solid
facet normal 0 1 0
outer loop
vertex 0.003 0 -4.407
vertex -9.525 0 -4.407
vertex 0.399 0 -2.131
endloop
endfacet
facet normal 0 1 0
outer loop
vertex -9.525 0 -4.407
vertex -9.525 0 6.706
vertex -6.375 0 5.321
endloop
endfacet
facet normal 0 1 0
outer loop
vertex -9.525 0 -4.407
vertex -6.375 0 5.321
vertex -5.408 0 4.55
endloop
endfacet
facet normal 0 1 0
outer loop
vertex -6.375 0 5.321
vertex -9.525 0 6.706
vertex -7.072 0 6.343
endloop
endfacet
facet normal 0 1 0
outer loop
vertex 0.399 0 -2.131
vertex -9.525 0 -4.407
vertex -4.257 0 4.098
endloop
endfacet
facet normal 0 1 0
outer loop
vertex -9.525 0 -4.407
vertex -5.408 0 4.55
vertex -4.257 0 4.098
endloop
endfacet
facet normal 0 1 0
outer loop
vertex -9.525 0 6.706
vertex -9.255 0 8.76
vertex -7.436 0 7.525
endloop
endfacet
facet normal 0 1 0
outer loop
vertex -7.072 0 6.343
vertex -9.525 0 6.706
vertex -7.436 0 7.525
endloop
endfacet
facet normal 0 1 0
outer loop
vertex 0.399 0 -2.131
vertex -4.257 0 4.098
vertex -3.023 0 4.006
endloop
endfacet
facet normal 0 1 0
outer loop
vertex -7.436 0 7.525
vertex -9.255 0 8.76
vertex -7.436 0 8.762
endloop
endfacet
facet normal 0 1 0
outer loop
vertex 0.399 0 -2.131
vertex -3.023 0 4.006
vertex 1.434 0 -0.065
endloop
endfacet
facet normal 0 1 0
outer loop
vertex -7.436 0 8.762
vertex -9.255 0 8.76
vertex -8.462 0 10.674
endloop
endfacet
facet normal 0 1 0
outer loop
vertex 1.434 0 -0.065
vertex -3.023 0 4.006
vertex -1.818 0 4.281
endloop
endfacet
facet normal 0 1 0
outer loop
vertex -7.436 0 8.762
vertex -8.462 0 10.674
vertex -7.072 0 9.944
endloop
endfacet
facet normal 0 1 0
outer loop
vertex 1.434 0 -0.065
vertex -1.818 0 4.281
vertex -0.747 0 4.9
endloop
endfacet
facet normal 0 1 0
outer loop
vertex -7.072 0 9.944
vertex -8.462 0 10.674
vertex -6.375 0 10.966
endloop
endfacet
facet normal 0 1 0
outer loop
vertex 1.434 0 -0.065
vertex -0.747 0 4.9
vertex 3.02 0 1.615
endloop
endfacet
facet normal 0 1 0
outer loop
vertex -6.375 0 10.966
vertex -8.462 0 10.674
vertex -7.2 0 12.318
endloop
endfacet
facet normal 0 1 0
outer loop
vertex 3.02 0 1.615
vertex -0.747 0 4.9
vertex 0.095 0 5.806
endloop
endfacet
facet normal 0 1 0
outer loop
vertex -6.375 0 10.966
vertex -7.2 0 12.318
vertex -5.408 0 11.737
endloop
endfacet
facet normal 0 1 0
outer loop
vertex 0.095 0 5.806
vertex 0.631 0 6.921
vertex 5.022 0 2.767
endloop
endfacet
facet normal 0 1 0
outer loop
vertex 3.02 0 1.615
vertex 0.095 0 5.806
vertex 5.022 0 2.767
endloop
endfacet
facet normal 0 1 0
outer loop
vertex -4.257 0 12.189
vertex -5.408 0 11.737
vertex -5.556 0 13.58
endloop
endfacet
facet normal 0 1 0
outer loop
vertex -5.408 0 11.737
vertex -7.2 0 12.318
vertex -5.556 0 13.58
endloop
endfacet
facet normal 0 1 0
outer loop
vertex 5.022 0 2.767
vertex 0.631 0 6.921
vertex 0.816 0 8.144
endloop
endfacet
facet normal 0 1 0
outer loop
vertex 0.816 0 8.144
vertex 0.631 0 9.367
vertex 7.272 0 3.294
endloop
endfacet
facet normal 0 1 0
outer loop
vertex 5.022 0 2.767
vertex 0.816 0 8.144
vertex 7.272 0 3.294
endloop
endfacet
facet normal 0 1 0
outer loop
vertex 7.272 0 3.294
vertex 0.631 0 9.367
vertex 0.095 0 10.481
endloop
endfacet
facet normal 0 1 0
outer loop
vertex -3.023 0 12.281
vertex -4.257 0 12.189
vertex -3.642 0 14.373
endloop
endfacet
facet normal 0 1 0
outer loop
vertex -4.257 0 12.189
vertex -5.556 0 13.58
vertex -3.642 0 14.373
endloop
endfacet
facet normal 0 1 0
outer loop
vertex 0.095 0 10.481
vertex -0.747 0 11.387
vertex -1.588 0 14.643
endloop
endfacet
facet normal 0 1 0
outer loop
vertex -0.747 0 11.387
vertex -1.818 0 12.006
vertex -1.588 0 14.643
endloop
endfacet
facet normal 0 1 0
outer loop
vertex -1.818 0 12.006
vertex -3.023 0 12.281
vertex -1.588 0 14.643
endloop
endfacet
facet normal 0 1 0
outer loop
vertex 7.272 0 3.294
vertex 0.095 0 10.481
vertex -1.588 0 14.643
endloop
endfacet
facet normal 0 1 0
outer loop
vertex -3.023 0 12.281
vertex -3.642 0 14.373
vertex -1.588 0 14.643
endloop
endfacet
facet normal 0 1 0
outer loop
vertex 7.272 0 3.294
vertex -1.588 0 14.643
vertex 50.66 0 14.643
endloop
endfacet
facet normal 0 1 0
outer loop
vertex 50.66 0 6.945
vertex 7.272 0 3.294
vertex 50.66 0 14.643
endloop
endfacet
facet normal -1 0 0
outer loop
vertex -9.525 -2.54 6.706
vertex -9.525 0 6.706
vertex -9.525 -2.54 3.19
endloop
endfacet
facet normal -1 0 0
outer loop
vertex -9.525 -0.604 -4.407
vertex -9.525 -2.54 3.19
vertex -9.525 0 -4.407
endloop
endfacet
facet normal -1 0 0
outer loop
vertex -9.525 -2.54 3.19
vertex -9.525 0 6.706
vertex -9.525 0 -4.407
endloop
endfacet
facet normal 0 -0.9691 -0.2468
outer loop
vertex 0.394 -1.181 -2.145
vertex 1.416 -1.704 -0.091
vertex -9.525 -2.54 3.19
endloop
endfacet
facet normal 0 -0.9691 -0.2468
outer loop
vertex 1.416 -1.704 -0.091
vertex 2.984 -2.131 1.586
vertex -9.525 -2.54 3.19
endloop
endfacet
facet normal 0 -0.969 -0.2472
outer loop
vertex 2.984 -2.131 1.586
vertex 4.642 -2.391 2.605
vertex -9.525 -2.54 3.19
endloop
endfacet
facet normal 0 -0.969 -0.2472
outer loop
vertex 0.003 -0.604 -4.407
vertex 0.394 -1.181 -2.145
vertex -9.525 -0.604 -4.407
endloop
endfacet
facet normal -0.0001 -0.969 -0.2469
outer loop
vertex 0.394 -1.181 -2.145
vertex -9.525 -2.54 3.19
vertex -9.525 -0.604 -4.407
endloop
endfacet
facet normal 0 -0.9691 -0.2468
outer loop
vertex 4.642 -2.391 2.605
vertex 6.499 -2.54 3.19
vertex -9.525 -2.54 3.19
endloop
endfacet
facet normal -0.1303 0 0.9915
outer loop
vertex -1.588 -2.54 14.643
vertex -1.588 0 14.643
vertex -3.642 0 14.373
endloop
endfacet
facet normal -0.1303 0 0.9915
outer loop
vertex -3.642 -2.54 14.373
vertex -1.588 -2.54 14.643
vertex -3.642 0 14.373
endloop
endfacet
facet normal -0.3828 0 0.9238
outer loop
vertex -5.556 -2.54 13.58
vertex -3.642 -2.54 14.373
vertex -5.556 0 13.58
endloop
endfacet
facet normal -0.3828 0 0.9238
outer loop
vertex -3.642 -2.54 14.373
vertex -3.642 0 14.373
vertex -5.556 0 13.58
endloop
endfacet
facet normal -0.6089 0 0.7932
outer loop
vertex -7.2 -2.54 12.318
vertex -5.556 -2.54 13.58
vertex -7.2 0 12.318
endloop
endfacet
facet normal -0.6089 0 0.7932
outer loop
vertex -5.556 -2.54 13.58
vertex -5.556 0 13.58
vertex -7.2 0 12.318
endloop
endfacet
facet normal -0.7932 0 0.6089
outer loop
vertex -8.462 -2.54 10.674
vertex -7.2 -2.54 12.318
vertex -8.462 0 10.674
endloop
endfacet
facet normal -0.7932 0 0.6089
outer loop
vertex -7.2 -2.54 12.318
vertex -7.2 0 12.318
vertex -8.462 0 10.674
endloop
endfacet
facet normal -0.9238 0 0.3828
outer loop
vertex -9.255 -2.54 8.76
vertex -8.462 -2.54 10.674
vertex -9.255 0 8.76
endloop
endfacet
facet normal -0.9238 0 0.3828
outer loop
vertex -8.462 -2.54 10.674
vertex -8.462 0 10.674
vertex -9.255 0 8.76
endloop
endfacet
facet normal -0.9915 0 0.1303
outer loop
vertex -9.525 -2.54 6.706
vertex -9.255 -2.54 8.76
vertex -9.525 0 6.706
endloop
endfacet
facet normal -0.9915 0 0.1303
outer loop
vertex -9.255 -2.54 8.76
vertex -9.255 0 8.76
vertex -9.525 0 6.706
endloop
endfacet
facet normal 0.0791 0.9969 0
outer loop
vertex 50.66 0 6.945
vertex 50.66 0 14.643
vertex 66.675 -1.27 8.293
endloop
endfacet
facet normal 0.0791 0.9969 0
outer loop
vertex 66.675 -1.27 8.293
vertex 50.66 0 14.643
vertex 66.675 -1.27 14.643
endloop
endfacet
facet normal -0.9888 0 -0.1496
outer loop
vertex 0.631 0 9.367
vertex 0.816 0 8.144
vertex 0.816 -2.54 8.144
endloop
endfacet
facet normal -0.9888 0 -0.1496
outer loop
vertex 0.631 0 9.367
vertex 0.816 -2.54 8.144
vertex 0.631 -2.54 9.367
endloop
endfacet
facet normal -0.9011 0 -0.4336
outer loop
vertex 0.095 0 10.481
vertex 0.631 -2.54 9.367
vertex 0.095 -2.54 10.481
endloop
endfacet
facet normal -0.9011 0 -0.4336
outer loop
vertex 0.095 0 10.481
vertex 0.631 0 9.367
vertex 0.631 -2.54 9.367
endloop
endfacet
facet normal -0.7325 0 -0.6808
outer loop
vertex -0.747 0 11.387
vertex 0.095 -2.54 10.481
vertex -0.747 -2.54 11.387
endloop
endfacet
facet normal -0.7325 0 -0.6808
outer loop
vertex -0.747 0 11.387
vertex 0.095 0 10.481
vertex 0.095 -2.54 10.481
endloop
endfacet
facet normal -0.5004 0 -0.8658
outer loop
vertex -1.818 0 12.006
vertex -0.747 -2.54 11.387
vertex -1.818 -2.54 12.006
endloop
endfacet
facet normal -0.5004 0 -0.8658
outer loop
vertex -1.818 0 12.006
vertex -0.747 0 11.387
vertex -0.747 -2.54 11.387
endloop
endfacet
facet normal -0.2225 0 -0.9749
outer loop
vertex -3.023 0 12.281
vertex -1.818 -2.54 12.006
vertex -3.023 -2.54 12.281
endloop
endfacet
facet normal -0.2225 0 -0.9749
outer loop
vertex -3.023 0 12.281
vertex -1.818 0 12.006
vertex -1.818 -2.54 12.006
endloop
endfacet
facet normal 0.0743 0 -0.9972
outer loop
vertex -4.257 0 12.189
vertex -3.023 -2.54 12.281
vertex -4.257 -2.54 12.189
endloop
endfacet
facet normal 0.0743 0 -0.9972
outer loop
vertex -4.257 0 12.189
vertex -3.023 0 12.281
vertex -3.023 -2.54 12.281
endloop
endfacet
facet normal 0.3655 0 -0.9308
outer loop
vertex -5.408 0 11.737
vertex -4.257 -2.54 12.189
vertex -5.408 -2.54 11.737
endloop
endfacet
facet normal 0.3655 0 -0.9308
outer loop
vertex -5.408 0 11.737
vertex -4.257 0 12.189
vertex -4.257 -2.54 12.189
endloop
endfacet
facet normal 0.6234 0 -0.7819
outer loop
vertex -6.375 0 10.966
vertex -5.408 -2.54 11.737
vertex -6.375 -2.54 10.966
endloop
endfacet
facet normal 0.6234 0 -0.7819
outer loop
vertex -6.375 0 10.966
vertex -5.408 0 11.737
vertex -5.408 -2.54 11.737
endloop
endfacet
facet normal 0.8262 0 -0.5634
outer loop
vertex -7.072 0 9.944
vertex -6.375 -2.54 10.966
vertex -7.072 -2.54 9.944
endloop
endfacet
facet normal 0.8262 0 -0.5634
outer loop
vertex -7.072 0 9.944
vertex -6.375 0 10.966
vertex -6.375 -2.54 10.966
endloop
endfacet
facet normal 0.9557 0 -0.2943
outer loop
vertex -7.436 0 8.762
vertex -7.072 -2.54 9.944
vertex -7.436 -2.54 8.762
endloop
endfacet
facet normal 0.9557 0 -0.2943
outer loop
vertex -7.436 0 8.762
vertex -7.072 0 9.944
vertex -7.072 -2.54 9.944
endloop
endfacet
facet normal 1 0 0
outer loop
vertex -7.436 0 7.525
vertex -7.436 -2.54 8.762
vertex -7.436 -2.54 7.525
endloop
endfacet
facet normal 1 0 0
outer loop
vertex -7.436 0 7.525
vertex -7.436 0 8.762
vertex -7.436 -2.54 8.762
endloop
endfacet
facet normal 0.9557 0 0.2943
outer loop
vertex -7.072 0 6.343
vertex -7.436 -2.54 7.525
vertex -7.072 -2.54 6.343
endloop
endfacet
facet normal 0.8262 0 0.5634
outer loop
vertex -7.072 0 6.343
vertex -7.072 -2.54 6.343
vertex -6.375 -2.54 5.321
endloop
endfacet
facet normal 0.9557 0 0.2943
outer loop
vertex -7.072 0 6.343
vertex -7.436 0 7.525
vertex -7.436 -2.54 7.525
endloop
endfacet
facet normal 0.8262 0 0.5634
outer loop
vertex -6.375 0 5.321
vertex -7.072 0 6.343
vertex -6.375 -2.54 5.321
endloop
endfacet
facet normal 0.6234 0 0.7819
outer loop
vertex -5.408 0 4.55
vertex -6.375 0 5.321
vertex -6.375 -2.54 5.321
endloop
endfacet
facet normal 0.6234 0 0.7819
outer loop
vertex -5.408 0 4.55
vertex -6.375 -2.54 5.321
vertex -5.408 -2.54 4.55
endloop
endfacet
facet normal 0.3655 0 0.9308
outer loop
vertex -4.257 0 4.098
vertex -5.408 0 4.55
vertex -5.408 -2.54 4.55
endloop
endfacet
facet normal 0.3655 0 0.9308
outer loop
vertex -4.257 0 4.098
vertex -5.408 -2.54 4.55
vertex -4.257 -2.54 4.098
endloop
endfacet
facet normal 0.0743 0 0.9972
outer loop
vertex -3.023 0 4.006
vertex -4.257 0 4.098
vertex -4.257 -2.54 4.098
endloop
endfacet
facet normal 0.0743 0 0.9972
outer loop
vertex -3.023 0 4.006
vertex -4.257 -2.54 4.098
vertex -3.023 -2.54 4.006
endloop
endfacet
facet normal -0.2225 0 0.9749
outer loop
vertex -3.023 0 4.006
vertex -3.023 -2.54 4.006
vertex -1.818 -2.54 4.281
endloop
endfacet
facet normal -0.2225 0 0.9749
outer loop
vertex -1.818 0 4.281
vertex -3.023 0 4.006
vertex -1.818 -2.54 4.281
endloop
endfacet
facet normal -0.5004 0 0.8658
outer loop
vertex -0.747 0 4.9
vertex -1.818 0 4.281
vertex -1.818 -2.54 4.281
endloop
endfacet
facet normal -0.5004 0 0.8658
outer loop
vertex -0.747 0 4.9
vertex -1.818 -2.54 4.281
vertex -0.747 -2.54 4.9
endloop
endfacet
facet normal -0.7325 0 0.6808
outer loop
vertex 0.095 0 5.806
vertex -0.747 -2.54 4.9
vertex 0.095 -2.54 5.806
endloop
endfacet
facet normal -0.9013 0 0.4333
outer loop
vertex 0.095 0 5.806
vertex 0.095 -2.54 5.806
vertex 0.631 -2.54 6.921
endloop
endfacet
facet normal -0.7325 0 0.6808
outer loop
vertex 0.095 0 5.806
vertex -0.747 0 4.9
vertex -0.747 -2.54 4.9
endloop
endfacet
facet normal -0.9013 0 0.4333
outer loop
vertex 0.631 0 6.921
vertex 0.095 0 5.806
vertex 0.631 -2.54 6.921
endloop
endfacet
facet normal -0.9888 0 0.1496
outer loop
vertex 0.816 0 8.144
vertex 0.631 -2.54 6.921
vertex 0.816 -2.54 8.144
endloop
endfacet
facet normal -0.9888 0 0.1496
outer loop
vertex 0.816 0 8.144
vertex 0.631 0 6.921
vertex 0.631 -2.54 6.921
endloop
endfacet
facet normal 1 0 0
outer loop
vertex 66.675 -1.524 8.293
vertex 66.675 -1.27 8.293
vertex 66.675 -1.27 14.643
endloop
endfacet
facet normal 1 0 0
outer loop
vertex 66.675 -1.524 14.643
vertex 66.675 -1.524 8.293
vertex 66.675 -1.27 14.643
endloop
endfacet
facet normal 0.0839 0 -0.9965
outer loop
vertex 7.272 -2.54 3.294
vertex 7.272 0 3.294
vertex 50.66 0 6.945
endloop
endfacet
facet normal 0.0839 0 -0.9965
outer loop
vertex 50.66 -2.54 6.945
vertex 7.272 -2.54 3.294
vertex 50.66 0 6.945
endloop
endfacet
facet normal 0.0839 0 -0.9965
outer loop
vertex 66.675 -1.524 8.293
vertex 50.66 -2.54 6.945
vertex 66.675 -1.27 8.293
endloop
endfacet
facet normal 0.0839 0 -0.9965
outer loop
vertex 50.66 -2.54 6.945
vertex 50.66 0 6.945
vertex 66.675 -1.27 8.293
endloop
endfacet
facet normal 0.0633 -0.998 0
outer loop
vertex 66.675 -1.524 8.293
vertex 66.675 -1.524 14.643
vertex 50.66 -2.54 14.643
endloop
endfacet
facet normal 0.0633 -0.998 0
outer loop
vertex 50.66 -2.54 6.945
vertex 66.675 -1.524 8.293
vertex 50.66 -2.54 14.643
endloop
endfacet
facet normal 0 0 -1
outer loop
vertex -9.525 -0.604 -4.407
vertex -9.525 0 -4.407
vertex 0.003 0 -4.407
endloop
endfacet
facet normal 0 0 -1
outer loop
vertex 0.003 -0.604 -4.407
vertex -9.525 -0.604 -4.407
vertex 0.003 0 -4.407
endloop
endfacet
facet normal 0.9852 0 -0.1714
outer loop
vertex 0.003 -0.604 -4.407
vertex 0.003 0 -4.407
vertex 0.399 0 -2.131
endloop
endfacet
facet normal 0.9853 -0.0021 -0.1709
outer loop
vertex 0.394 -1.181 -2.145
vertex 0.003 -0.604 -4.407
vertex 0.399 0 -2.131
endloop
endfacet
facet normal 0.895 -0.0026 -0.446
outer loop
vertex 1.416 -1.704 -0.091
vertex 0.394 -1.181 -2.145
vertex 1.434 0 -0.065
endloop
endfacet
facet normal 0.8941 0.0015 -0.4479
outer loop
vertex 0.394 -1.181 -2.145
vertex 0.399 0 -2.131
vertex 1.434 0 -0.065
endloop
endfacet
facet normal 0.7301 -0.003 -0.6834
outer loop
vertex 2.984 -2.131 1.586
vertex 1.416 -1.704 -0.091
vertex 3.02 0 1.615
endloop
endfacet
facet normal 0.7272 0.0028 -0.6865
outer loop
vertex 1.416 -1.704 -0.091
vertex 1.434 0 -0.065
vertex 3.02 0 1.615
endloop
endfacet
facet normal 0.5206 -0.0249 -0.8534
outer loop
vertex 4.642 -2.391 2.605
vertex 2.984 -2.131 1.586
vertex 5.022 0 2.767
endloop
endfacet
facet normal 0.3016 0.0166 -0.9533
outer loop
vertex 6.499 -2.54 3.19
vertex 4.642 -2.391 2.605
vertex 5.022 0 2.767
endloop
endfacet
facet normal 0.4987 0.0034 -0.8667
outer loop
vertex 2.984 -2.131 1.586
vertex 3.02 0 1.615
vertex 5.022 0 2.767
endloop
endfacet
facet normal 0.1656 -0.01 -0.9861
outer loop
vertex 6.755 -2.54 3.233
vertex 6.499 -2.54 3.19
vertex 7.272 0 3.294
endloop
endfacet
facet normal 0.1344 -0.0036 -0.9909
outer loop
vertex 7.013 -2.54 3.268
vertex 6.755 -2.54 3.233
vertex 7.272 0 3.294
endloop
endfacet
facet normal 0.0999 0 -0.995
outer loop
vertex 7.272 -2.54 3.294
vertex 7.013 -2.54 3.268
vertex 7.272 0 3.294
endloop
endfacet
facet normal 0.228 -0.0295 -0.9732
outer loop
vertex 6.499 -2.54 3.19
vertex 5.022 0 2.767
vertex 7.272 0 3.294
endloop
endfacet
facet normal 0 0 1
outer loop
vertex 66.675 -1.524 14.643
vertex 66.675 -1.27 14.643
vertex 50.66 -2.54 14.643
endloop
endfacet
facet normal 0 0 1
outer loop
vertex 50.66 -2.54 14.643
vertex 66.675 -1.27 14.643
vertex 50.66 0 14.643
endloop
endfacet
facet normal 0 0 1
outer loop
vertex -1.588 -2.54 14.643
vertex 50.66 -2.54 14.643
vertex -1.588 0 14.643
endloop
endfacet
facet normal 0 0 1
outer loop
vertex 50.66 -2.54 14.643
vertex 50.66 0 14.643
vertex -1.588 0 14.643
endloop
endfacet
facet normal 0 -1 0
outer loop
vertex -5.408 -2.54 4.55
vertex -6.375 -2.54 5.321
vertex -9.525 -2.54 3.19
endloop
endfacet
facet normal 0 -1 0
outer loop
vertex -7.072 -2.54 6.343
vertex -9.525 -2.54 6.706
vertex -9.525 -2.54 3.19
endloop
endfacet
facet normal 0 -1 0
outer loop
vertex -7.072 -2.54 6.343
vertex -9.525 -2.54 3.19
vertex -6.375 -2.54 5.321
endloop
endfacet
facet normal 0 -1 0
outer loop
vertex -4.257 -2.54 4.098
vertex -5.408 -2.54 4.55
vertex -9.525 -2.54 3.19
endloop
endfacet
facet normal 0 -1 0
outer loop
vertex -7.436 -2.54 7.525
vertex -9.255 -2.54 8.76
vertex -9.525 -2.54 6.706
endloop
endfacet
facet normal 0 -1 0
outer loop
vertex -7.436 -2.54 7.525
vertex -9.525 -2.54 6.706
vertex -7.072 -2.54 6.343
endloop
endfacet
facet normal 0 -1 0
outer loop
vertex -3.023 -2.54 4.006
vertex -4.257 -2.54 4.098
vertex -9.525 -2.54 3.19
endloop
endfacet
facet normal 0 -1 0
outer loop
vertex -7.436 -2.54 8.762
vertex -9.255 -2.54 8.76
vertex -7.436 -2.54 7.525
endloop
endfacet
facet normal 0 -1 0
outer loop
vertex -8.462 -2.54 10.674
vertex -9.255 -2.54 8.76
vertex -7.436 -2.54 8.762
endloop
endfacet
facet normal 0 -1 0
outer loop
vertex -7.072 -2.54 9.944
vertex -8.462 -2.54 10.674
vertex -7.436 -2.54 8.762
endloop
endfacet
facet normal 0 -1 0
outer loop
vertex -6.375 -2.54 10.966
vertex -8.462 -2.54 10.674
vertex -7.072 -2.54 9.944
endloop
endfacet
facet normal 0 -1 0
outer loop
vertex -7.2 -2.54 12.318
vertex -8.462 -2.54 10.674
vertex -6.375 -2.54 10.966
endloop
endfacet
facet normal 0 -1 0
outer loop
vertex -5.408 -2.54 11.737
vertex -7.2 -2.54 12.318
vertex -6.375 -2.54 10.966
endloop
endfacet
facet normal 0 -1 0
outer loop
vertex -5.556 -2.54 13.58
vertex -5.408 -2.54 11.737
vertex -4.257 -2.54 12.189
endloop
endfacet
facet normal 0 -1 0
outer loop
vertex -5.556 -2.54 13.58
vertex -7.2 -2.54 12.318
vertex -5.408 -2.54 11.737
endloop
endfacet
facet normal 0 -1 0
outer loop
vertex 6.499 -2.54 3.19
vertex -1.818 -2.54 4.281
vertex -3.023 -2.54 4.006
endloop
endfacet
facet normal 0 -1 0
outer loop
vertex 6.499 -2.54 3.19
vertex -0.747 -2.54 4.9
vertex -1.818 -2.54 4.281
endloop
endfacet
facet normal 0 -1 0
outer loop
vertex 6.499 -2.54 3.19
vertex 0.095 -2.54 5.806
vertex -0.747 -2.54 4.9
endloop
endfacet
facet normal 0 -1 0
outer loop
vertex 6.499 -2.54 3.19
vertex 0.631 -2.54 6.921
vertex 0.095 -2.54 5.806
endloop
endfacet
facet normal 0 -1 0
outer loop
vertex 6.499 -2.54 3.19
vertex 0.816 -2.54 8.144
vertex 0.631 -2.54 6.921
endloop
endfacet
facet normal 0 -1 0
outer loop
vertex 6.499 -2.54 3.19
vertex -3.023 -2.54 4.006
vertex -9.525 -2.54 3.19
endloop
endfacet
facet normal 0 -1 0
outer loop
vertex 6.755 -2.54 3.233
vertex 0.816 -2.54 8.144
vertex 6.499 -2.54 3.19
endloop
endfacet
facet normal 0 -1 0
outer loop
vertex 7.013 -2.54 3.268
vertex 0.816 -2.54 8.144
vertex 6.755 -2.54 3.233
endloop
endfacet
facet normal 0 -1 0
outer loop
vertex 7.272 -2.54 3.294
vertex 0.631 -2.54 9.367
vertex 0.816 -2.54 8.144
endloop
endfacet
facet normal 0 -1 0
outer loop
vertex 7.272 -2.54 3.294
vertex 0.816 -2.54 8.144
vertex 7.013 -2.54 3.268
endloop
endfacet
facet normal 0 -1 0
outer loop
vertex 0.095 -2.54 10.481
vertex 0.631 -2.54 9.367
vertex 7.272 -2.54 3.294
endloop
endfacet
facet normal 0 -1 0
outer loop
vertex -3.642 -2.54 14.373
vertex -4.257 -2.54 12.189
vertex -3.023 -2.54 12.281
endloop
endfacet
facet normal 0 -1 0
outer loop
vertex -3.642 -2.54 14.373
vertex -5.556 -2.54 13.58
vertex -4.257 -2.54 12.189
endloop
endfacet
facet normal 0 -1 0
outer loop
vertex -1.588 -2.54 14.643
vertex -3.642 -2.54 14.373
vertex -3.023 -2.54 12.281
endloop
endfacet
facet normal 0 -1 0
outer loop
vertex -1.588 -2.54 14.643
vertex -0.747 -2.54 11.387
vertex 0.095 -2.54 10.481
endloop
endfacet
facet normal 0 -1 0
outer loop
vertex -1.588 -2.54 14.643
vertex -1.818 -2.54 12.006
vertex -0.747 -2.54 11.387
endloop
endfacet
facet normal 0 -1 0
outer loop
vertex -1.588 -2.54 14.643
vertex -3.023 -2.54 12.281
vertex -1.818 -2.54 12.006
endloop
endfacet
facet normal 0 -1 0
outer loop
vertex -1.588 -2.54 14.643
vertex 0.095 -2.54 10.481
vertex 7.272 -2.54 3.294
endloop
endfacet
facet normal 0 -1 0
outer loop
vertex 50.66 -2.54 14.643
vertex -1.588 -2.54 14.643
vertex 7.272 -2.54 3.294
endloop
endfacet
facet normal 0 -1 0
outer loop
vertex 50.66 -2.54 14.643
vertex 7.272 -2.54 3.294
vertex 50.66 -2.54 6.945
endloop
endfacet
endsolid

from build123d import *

# Parameters (mm, degrees)
F0_R     = 4.149094
F1_DEPTH = 2.54
F3_DEPTH = 25.4
F4_DEPTH = 25.4
F6_DEPTH = 25.4


with BuildPart() as f1:
    # F0 (on Front) → F1 (new body)
    with BuildSketch(Plane.XZ):
        with BuildLine():
            Line((-9.525, 6.705717), (-9.525, -4.406783))
            Line((-9.525, -4.406783), (0, -4.406783))
            Line((0, -4.406783), (0, -4.615923))
            ThreePointArc((0, -4.615923), (2.094218, 0.756224), (7.271803, 3.293612))
            Line((7.271803, 3.293612), (66.675, 8.293217))
            Line((66.675, 8.293217), (66.675, 14.643217))
            Line((66.675, 14.643217), (-1.5875, 14.643217))
            ThreePointArc((-1.5875, 14.643217), (-7.20016, 12.318377), (-9.525, 6.705717))
        make_face()
        with Locations((-3.333452, 8.143553)):
            Circle(F0_R, mode=Mode.SUBTRACT)
    extrude(amount=F1_DEPTH)

    # F2 (on face) → F3 (cut)
    with BuildSketch(Plane(origin=(-9.525, 0, 0), x_dir=(0, -1, 0), z_dir=(-1, 0, 0))):
        Polygon((2.54, -4.406783), (2.54, 3.190069), (0.604368, -4.406783), align=None)
    extrude(amount=-F3_DEPTH, mode=Mode.SUBTRACT)

    # F1_face (on face) → F4 (cut)
    with BuildSketch(Plane(origin=(-9.525, -1.27, 1.149467), x_dir=(0, -1, 0), z_dir=(-1, 0, 0))):
        Polygon((-0.665632, -5.55625), (-1.27, -5.55625), (-1.27, -5.76539), (1.27, -5.76539), (1.27, -5.55625), align=None)
    extrude(amount=-F4_DEPTH, mode=Mode.SUBTRACT)

    # F5 (on face) → F6 (cut)
    with BuildSketch(Plane.XY.offset(14.643217)):
        Polygon((66.675, 0), (50.660294, 0), (66.675, -1.27), align=None)
        Polygon((66.675, -1.524), (50.660294, -2.54), (66.675, -2.54), align=None)
    extrude(amount=-F6_DEPTH, mode=Mode.SUBTRACT)


solid = f1.part
